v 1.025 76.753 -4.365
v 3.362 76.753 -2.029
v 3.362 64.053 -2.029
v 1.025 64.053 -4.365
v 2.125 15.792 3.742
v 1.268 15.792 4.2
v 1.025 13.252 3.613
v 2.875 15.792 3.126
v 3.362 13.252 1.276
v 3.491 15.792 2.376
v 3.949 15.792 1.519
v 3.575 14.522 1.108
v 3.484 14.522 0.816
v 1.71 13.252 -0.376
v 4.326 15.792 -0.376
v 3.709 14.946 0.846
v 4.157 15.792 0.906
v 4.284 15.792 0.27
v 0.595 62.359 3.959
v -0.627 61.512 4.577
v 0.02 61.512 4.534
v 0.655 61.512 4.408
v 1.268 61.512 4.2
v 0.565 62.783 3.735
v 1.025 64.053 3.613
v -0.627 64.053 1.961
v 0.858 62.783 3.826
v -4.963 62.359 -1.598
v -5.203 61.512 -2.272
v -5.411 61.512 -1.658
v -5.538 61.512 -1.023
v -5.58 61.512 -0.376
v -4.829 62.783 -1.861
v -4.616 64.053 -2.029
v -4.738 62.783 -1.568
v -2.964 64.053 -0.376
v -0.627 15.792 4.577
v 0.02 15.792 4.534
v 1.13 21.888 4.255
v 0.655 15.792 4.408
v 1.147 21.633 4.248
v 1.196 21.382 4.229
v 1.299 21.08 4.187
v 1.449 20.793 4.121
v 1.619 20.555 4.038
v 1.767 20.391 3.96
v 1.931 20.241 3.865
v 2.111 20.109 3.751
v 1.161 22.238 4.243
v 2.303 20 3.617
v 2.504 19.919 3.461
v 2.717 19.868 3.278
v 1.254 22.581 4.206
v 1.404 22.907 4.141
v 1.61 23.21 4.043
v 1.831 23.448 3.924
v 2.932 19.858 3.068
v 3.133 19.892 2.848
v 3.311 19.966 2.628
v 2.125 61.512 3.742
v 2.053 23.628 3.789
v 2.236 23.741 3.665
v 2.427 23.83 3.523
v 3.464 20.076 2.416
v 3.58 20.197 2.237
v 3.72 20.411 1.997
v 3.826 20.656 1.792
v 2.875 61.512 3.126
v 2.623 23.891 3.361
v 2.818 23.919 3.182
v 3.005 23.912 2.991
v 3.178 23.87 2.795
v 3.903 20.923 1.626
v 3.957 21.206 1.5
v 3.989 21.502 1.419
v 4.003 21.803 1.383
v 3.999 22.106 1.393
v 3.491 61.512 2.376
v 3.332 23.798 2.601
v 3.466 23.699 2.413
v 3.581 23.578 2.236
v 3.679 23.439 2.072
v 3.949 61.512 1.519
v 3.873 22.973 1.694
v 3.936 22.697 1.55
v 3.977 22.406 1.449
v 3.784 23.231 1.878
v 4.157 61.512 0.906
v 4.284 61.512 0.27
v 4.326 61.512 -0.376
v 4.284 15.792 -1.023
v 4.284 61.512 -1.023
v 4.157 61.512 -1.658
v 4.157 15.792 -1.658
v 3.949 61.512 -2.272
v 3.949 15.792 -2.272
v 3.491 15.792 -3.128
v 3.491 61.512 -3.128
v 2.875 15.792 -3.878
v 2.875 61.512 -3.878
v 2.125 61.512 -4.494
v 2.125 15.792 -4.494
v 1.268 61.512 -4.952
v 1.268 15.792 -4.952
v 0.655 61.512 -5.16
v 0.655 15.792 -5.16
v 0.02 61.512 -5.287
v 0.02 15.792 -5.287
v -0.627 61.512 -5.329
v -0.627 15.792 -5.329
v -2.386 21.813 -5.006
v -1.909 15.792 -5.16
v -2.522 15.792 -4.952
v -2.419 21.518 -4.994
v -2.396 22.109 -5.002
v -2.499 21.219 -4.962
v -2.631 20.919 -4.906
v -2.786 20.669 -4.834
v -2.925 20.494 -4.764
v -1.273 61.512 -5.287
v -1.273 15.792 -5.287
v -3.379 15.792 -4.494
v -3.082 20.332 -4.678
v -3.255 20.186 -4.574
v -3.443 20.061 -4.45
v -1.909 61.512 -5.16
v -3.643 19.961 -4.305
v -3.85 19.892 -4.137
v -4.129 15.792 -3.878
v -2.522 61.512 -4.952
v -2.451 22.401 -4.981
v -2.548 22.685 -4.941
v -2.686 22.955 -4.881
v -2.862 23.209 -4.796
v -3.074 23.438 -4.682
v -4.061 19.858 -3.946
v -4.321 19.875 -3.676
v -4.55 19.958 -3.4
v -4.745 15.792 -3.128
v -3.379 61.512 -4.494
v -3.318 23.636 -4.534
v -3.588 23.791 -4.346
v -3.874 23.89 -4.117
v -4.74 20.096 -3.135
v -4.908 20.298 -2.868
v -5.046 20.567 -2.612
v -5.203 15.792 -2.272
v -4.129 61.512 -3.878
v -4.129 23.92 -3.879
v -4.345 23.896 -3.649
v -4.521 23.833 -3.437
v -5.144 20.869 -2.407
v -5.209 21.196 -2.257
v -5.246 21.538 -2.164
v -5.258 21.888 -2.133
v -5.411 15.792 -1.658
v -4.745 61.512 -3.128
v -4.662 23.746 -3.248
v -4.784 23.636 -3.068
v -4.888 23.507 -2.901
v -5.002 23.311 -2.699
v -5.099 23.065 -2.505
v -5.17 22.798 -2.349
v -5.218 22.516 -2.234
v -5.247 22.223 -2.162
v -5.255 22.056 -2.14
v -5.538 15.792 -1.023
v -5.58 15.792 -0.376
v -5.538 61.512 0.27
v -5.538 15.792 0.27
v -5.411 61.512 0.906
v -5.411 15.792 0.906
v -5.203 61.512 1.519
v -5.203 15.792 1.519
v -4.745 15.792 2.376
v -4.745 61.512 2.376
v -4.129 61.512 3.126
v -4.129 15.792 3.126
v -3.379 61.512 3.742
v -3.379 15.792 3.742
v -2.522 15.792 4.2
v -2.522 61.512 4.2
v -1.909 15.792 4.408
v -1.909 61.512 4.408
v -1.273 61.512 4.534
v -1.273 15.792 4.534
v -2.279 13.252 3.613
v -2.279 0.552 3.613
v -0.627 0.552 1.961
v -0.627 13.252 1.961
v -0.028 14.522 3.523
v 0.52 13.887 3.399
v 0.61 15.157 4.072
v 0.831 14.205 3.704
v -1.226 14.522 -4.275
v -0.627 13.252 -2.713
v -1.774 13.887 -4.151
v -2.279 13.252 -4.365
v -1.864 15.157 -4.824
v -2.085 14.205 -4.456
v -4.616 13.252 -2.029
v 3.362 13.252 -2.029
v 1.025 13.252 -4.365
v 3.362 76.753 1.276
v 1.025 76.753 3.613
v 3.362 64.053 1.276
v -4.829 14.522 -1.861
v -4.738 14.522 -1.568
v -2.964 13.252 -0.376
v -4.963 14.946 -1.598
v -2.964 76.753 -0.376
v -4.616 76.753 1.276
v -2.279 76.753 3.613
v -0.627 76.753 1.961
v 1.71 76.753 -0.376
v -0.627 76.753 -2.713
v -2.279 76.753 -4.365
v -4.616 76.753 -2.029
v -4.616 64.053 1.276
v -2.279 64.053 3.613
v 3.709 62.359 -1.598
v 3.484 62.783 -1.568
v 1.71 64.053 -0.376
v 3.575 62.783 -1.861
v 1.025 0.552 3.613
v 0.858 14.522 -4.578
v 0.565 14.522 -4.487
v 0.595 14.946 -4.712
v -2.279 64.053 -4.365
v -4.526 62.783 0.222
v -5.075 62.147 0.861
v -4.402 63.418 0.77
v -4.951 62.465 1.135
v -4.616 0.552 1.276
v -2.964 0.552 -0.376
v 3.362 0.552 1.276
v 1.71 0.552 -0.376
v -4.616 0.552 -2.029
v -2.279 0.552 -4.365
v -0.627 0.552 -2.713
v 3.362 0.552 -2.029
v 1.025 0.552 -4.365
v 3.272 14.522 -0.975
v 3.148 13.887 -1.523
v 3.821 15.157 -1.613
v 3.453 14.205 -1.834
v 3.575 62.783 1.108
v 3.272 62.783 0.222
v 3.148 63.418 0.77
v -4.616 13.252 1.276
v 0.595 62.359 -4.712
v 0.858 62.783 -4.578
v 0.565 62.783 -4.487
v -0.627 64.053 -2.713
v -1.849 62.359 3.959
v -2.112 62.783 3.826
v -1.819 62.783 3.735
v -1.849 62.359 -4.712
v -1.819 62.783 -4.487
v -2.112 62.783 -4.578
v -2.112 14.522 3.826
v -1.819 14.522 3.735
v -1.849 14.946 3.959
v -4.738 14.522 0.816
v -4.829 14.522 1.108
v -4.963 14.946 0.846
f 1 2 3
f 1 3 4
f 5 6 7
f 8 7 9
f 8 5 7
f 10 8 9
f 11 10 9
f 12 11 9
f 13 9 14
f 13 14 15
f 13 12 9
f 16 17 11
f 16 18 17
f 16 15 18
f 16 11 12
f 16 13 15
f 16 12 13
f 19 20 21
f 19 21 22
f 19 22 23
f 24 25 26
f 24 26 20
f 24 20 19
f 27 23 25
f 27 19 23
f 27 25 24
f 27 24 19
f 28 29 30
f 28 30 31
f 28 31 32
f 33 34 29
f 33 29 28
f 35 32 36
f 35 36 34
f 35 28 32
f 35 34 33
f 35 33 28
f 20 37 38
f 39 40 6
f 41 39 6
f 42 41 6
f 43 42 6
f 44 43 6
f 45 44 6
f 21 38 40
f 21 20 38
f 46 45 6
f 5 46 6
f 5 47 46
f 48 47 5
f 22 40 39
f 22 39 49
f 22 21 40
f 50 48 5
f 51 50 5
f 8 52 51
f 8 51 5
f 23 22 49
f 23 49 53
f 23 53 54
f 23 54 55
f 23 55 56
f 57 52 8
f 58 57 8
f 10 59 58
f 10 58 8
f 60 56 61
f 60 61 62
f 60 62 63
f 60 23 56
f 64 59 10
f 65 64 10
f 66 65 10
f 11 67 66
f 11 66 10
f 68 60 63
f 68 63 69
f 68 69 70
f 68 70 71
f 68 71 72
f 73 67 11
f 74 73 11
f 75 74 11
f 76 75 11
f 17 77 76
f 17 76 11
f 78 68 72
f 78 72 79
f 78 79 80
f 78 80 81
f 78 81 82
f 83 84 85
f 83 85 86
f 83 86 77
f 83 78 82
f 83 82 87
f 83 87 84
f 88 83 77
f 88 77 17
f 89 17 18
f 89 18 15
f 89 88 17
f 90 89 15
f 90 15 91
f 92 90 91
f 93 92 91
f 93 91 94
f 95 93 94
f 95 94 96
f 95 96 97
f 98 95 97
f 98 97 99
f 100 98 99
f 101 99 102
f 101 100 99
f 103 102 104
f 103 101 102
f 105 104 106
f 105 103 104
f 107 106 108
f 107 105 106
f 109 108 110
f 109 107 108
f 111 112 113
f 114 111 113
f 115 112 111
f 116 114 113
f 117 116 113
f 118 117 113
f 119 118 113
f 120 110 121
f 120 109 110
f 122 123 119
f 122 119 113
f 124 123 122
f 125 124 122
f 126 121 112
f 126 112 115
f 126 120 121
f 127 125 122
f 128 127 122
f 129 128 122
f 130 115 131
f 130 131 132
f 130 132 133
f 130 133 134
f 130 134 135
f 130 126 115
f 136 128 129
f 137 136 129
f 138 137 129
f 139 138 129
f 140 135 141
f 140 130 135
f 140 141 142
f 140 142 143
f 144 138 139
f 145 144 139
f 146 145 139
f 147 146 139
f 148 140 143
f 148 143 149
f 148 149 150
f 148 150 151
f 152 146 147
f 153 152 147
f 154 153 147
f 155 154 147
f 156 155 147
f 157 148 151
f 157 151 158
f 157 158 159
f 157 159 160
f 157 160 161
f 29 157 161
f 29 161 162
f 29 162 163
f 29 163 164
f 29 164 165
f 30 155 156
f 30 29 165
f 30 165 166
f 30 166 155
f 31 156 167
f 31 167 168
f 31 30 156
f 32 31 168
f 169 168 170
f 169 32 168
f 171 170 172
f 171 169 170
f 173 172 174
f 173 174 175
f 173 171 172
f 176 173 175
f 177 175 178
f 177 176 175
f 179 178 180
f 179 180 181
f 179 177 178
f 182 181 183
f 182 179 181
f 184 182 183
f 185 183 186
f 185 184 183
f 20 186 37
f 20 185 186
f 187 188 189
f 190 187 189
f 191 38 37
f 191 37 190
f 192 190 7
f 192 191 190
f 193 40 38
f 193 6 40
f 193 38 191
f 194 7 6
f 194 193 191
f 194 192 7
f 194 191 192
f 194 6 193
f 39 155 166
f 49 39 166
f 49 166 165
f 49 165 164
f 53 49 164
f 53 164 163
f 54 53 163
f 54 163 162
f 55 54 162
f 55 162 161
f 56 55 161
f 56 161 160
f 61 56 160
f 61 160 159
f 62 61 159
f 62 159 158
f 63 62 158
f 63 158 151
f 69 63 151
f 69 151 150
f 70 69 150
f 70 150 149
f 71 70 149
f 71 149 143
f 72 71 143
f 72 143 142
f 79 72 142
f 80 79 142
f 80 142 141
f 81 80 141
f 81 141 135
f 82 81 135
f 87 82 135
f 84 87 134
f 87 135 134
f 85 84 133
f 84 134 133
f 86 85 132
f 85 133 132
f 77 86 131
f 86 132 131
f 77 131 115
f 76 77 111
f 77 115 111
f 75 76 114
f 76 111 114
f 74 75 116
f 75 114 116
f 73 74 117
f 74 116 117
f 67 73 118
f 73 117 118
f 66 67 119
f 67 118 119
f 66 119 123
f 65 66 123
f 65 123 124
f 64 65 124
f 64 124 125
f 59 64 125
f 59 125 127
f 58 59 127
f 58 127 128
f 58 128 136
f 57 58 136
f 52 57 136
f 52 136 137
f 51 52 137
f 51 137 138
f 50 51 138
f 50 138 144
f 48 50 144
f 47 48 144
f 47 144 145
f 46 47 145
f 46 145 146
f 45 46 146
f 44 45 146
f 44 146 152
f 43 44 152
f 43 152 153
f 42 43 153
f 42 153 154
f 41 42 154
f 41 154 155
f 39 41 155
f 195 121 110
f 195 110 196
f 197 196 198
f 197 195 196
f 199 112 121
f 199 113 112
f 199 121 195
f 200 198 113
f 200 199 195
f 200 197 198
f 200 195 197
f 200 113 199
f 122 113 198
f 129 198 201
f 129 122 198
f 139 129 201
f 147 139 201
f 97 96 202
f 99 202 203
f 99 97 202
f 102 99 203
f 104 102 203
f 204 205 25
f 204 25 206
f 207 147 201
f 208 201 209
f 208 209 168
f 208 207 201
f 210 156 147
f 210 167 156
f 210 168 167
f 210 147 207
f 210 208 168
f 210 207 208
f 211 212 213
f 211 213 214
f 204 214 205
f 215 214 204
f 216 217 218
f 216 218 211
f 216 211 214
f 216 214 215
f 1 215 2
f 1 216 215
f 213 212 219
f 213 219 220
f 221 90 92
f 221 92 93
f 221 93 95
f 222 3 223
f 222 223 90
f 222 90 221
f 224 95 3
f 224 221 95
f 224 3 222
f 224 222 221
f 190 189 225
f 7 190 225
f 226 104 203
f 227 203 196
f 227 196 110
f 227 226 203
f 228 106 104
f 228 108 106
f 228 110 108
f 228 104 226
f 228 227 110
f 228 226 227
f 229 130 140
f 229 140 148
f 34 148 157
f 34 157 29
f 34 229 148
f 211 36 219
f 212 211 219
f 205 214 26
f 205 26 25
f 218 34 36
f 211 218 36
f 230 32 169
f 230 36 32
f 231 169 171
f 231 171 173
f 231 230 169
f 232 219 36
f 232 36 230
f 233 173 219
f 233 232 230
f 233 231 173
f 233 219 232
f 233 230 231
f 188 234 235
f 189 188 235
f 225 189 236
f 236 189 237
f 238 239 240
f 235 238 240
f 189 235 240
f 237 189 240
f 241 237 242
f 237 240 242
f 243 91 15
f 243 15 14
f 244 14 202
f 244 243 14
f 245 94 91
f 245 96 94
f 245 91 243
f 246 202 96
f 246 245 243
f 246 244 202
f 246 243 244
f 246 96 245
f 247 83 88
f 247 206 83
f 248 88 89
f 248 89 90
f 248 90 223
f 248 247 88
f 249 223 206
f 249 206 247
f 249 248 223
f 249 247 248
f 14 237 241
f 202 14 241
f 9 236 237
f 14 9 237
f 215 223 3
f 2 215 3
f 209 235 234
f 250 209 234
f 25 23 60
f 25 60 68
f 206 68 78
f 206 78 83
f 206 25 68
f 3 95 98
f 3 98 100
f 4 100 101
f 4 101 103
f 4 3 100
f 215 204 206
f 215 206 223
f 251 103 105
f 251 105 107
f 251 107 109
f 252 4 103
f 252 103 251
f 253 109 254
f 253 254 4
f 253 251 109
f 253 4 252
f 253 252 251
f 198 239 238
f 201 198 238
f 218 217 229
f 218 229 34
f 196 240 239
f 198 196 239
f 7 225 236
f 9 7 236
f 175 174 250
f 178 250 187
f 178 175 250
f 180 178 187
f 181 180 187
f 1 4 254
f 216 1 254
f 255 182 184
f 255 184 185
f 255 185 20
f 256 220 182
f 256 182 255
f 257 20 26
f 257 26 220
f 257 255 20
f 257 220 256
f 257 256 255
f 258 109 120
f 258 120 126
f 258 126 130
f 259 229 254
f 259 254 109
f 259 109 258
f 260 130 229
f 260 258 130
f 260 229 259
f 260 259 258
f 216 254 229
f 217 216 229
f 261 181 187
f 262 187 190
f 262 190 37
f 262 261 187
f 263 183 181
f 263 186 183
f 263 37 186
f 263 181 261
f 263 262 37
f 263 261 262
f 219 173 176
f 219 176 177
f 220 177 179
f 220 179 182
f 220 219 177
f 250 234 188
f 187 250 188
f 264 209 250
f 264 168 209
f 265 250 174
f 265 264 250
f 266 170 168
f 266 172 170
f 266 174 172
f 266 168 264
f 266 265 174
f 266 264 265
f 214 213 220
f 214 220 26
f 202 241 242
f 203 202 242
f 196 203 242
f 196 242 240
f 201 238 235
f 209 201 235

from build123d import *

# Parameters (mm, degrees)
BOSS_EXTRUDE1_DEPTH = 13.804347826
SCALE1_SCALE        = 0.92
SKETCH2_R           = 4.953
SKETCH3_R           = 4.953
BOSS_EXTRUDE2_DEPTH = 22.86
BOSS_EXTRUDE4_DEPTH = 13.804347826
SCALE2_SCALE        = 0.92
SKETCH6_R           = 2.032
CUT_EXTRUDE1_DEPTH  = 78.679240568


with BuildPart() as part:
    # Sketch1 → Boss-Extrude1 (new body)
    with BuildSketch(Plane(origin=(0, 0, 0), x_dir=(1, 0, 0), z_dir=(0, 1, 0))):
        Polygon((-0.6269783, 2.91618698), (-2.423029524, 4.712238204), (-4.963029524, 2.172238204), (-3.1669783, 0.37618698), (-4.963029524, -1.419864244), (-2.423029524, -3.959864244), (-0.6269783, -2.16381302), (1.169072924, -3.959864244), (3.709072924, -1.419864244), (1.9130217, 0.37618698), (3.709072924, 2.172238204), (1.169072924, 4.712238204), align=None)
    extrude(amount=BOSS_EXTRUDE1_DEPTH)


with BuildPart() as part_1:
    # Scale1: scaled about (-0.6269783, 6.902173913, -0.37618698)
    add(part.part.scale(SCALE1_SCALE).moved(Location((-0.050158264, 0.552173913, -0.030094958))))

    # Sketch2 → section 1 of loft1
    with BuildSketch(Plane(origin=(0, 15.792173913, 0), x_dir=(1, 0, 0), z_dir=(0, 1, 0)), mode=Mode.PRIVATE) as loft1_s1:
        with Locations((-0.6269783, 0.37618698)):
            Circle(SKETCH2_R)
    # loft from a face of the part (loft1)
    loft([part_1.faces().sort_by_distance((-0.6269783, 13.252173913, -0.37618698))[0], loft1_s1.sketch])

    # Sketch3 → Boss-Extrude2 (add)
    with BuildSketch(Plane(origin=(0, 15.792173913, 0), x_dir=(1, 0, 0), z_dir=(0, 1, 0))):
        with Locations(Location((-0.6269783, 0.37618698, 0), (0, 0, 270))):
            Circle(SKETCH3_R)
    boss_extrude2 = extrude(amount=BOSS_EXTRUDE2_DEPTH)

    # Mirror6: Boss-Extrude2 across plane
    add(boss_extrude2.mirror(Plane(origin=(-0.6269783, 38.652173913, -0.37618698), x_dir=(0, 0, 1), z_dir=(0, 1, 0))))



with BuildPart() as body_2:
    # Sketch5 → Boss-Extrude4 (new body)
    with BuildSketch(Plane(origin=(0, 63.500993913, 0), x_dir=(1, 0, 0), z_dir=(0, 1, 0))):
        Polygon((-0.6269783, 2.91618698), (-2.423029524, 4.712238204), (-4.963029524, 2.172238204), (-3.1669783, 0.37618698), (-4.963029524, -1.419864244), (-2.423029524, -3.959864244), (-0.6269783, -2.16381302), (1.169072924, -3.959864244), (3.709072924, -1.419864244), (1.9130217, 0.37618698), (3.709072924, 2.172238204), (1.169072924, 4.712238204), align=None)
    extrude(amount=BOSS_EXTRUDE4_DEPTH)


with BuildPart() as body_2_1:
    # Scale2: scaled about (-0.6269783, 70.403167826, -0.37618698)
    add(body_2.part.scale(SCALE2_SCALE).moved(Location((-0.050158264, 5.632253426, -0.030094958))))


with BuildPart() as part_2:
    add(part_1.part)

    add(body_2_1.part)  # loft2 joins it to this body
    # loft from a face of the part (loft2)
    loft([part_2.faces().sort_by_distance((-0.6269783, 61.512173913, -0.37618698))[0], part_2.faces().sort_by_distance((-0.6269783, 64.053167826, -0.37618698))[0]])

    # Sketch6 → Cut-Extrude1 (cut, through all)
    with BuildSketch(Plane(origin=(-4.003882527, 0, -4.003882527), x_dir=(-0.7071067811865471, 0, 0.7071067811865479), z_dir=(-0.7071067811865479, 0, -0.7071067811865471))):
        with Locations((0.177336243, 21.888173913)):
            Circle(SKETCH6_R)
    extrude(amount=-CUT_EXTRUDE1_DEPTH, mode=Mode.SUBTRACT)


solid = part_2.part
